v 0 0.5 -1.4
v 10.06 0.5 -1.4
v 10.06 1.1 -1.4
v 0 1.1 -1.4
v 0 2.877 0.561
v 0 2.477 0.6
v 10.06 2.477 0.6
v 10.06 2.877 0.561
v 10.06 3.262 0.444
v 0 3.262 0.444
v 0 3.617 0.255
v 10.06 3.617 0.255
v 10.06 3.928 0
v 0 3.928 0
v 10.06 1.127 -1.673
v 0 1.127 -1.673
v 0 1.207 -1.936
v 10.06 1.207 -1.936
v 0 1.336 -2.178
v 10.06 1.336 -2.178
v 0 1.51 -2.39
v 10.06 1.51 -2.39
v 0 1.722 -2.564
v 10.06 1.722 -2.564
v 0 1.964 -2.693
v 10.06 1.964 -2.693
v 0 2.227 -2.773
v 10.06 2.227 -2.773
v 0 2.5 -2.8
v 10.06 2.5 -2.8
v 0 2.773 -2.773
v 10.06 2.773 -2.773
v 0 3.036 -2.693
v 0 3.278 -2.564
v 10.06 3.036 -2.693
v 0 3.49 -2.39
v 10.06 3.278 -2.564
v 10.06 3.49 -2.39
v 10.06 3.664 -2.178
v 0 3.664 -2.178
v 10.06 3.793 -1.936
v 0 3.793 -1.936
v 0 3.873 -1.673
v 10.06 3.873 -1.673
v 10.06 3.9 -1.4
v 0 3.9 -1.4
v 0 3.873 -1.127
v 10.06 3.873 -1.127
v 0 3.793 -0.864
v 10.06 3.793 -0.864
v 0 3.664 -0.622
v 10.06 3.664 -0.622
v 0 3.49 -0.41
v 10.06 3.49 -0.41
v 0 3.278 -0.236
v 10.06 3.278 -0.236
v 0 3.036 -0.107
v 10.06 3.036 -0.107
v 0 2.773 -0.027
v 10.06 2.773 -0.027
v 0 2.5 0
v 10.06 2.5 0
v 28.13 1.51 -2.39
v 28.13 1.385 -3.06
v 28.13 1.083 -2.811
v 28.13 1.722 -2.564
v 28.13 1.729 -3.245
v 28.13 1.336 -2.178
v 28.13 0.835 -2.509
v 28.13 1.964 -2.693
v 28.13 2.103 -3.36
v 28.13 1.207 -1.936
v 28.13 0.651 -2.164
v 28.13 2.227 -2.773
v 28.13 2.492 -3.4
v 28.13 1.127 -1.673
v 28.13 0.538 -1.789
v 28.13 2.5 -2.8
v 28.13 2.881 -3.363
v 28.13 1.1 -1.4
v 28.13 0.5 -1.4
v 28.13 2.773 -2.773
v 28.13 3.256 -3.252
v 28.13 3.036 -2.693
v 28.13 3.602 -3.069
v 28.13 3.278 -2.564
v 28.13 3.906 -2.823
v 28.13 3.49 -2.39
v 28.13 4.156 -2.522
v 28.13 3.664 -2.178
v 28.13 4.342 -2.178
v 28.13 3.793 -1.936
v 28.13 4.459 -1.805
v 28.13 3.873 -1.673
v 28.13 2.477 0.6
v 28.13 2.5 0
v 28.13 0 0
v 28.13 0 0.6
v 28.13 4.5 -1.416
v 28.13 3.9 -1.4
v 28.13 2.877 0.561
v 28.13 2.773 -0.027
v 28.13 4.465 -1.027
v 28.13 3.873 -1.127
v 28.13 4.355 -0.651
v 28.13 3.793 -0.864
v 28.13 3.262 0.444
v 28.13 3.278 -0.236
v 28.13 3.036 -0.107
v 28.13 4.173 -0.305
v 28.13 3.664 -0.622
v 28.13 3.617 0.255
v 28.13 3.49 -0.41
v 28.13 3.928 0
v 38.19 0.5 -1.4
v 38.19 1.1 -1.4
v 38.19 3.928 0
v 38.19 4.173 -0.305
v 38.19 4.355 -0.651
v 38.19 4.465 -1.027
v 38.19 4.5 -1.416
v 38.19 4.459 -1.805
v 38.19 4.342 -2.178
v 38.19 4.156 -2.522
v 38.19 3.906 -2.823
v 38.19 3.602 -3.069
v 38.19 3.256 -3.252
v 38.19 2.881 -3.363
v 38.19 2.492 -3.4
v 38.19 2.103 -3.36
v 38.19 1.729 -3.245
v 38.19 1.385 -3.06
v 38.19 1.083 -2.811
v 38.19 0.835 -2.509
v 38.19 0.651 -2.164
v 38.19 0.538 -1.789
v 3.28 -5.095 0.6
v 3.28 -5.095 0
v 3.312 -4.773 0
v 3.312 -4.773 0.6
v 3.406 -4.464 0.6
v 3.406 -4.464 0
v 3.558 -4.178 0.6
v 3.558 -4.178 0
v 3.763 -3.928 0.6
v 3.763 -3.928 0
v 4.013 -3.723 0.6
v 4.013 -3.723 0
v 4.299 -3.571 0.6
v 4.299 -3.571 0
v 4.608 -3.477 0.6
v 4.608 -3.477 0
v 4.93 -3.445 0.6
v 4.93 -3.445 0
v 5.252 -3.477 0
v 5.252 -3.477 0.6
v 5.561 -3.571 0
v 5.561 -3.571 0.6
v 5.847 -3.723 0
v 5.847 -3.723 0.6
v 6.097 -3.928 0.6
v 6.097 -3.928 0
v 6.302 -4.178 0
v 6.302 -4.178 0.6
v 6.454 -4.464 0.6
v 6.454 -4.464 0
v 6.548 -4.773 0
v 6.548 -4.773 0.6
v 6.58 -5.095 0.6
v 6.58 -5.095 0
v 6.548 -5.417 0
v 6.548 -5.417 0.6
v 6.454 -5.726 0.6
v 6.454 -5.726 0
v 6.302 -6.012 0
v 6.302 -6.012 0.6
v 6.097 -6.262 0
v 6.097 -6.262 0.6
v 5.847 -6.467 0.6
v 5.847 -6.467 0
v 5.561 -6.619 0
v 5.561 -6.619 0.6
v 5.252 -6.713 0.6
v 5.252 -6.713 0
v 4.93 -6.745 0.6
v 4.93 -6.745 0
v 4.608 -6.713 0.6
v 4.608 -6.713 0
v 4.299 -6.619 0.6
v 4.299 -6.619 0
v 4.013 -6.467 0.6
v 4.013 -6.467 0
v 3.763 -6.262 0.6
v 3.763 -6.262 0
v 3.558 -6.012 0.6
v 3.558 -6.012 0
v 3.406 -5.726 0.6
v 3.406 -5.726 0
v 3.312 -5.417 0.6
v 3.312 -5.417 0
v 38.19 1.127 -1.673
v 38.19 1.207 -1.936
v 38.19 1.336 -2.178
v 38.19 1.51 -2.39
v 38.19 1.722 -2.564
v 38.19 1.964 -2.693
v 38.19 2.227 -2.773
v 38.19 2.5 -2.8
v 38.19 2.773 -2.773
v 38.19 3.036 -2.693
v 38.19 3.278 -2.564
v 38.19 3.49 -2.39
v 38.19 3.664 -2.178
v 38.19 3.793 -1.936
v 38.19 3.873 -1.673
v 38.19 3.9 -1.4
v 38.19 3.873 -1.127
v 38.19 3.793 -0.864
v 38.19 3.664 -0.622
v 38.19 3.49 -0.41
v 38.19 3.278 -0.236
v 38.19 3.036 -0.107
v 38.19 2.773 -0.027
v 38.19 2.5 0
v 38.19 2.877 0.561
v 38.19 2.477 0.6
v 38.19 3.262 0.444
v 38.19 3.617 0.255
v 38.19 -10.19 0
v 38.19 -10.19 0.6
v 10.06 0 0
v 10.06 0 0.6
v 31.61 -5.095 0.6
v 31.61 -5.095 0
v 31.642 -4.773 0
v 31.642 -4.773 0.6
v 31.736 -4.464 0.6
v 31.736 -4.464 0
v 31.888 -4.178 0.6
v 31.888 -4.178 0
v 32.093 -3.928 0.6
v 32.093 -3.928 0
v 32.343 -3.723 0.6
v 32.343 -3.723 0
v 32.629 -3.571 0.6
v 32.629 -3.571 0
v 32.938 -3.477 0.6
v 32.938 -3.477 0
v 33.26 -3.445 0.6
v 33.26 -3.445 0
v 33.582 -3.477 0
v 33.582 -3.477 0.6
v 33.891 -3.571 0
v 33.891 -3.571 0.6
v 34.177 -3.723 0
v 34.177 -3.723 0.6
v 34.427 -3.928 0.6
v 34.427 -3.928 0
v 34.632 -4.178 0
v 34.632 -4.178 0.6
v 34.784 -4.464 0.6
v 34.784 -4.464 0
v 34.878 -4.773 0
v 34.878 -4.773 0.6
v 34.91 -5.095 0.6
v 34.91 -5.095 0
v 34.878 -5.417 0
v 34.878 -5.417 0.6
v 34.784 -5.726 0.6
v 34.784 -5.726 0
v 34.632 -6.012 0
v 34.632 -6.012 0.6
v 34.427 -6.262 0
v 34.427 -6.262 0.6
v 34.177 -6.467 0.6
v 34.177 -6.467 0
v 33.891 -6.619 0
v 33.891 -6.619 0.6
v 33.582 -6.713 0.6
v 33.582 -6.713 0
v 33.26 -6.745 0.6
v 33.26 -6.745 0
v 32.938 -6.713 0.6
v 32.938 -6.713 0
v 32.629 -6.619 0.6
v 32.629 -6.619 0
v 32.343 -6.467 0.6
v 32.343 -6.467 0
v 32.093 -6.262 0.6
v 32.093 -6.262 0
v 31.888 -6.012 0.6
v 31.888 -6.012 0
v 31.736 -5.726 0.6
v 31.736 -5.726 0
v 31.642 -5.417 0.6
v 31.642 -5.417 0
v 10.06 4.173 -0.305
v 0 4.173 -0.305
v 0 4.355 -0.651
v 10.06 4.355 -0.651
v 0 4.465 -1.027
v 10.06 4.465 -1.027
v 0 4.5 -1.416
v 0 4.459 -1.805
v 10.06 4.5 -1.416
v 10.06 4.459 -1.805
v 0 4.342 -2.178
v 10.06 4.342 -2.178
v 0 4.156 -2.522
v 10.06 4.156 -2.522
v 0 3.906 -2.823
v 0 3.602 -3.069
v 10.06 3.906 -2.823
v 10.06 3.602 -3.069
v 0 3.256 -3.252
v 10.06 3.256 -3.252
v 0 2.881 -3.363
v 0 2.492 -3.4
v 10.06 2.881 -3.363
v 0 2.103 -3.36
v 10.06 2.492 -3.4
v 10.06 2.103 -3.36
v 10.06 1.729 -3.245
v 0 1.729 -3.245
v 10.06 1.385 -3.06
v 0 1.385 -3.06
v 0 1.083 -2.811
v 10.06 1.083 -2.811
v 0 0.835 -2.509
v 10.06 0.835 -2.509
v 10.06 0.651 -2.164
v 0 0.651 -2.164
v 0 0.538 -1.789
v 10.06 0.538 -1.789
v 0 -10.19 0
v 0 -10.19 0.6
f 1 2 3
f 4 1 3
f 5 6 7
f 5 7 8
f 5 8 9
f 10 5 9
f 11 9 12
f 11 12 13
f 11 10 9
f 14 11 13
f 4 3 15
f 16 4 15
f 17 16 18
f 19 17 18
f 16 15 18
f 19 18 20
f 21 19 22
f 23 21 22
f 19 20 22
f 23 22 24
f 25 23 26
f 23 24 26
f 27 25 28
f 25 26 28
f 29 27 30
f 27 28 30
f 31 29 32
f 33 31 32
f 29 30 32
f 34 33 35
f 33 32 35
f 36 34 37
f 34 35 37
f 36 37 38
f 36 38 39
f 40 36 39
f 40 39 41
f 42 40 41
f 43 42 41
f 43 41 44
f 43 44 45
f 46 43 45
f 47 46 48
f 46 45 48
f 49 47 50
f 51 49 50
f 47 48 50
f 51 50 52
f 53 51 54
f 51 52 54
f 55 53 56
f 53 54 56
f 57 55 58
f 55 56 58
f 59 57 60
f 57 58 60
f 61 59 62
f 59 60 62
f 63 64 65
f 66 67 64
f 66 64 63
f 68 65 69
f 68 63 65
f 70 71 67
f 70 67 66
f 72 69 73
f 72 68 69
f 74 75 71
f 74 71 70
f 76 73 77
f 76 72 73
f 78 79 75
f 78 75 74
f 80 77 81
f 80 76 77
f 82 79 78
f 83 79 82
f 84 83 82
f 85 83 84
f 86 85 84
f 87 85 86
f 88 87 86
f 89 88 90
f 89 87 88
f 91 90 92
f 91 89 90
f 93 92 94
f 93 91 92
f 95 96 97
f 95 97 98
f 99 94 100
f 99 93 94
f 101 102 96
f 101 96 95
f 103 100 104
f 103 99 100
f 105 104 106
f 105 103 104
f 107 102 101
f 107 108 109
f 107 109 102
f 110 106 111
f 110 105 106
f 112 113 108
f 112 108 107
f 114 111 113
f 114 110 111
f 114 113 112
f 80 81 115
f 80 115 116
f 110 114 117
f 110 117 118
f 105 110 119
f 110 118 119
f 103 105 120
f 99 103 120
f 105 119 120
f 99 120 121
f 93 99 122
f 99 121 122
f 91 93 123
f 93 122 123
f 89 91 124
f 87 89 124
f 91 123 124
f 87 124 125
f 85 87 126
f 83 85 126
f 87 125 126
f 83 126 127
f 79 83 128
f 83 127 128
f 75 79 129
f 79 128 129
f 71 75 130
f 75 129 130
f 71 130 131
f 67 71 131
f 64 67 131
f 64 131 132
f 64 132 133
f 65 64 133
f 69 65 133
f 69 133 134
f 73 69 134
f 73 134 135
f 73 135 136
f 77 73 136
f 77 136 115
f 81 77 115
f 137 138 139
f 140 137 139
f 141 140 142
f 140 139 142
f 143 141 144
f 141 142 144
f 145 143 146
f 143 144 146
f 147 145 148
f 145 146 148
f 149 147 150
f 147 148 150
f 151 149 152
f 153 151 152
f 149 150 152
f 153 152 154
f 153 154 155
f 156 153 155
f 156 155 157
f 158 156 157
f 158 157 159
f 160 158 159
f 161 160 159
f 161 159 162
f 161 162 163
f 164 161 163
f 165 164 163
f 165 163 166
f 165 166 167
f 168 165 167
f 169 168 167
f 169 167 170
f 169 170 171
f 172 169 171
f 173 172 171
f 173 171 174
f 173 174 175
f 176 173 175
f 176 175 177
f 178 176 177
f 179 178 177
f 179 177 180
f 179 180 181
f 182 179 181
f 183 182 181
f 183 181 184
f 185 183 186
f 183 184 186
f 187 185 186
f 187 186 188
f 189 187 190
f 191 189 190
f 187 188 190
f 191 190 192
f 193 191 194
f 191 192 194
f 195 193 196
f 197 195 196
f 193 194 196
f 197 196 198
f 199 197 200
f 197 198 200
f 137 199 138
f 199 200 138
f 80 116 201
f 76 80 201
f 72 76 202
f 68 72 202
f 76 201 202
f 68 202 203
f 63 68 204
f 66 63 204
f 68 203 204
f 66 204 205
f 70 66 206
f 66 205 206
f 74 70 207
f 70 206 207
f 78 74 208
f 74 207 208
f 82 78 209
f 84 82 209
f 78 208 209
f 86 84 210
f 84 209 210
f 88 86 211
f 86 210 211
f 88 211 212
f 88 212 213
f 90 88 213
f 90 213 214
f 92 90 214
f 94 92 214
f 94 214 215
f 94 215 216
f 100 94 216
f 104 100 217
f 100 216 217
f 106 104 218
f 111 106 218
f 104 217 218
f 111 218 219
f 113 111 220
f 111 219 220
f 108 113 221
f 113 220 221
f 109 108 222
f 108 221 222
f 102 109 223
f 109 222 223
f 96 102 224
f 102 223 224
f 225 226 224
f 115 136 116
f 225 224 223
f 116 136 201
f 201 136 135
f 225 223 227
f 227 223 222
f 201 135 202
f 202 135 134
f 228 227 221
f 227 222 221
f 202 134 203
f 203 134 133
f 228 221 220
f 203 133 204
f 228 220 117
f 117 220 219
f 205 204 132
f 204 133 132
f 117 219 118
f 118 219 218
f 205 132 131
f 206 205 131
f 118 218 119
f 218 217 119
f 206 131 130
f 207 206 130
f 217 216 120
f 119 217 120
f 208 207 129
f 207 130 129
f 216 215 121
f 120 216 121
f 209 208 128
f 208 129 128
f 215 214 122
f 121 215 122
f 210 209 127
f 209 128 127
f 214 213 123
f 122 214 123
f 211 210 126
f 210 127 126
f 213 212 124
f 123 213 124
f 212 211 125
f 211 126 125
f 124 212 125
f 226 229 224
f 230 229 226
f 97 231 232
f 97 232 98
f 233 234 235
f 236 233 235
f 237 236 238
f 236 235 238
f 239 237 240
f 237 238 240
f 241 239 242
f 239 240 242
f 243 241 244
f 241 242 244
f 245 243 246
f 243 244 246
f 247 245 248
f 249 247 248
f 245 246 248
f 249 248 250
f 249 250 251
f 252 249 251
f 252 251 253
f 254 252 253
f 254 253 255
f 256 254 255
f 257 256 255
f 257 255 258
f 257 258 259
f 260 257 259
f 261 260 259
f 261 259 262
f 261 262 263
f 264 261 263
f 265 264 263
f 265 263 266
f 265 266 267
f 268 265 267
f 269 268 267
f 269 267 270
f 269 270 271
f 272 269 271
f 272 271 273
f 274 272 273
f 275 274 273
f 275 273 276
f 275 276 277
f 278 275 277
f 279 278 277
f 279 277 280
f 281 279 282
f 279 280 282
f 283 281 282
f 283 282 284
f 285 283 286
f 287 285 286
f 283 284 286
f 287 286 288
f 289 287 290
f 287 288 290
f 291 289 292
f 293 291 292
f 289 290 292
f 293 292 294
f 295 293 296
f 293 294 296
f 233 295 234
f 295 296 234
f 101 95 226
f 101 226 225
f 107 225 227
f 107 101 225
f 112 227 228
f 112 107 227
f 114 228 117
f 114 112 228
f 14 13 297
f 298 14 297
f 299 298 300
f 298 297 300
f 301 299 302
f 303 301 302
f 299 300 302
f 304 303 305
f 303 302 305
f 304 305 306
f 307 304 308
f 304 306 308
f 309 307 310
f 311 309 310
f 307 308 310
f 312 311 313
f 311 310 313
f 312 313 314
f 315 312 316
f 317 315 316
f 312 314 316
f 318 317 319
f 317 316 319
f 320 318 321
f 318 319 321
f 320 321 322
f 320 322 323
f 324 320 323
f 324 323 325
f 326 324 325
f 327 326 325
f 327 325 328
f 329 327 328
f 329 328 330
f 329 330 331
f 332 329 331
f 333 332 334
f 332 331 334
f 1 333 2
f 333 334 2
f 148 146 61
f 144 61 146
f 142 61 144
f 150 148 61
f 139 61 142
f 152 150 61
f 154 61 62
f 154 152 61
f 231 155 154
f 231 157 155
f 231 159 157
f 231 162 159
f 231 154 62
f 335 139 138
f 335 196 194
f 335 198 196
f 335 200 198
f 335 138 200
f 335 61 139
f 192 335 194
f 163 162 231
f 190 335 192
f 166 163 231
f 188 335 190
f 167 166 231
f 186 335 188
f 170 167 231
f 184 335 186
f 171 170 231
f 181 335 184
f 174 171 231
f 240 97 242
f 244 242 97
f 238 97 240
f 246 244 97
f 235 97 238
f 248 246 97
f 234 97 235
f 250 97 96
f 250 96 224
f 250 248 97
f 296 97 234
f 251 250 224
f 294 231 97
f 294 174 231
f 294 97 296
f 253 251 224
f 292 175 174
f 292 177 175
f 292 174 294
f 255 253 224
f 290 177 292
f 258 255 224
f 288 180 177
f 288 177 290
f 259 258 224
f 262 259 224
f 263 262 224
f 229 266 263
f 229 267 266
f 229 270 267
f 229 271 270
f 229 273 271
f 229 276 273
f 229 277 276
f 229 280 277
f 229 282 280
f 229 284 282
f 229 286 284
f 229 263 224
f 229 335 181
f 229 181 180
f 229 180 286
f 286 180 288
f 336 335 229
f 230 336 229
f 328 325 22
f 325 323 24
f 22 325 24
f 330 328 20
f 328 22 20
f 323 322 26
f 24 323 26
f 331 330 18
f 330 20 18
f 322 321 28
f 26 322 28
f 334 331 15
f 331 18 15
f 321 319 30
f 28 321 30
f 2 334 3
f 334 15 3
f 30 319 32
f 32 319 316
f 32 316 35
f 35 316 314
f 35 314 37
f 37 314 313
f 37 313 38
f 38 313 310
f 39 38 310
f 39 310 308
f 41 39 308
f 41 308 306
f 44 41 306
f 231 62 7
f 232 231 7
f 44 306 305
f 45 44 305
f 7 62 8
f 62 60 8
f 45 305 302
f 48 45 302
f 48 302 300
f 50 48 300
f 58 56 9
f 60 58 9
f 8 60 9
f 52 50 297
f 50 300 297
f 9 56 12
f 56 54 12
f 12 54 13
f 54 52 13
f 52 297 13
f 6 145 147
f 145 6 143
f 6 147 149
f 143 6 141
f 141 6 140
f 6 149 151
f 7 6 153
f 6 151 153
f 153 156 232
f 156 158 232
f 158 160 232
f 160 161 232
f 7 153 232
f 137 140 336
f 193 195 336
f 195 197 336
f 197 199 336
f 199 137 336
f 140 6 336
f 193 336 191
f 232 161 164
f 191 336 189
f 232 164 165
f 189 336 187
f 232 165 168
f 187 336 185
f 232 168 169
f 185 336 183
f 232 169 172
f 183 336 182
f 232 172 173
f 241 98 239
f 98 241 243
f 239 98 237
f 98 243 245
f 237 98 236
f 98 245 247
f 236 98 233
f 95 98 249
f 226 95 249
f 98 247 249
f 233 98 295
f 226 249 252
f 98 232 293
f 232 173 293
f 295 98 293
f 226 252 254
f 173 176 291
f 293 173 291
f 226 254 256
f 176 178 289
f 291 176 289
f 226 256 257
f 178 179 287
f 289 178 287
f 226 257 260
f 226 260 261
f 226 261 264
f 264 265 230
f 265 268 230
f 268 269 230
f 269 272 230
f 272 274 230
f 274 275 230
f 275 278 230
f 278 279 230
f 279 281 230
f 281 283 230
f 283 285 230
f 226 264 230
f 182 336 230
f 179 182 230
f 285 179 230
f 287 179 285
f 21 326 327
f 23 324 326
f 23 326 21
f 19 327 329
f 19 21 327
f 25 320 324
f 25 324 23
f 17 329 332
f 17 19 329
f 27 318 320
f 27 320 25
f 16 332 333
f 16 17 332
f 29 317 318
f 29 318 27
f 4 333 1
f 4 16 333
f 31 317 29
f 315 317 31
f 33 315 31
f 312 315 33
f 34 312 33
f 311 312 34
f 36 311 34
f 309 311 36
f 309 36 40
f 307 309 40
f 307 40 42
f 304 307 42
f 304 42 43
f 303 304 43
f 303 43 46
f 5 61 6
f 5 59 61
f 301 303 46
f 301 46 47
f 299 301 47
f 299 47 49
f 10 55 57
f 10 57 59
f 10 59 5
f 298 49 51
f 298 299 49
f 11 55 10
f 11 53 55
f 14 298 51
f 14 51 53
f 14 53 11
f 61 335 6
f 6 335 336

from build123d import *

# Parameters (mm, degrees)
SKETCH1_W           = 38.19
SKETCH1_H           = 10.19
BOSS_EXTRUDE1_DEPTH = 0.6
SKETCH2_W           = 10.06
SKETCH2_H           = 0.6
BOSS_EXTRUDE2_DEPTH = 4.5
BOSS_EXTRUDE3_DEPTH = 10.06
BOSS_EXTRUDE4_START = -10.06
BOSS_EXTRUDE4_DEPTH = 10.06
CUT_EXTRUDE1_DEPTH  = 40.672058177
SKETCH7_R           = 1.65
CUT_EXTRUDE2_DEPTH  = 10.01


with BuildPart() as part:
    # Sketch1 → Boss-Extrude1 (new body)
    with BuildSketch(Plane.XY):
        with Locations((19.095, -5.095)):
            Rectangle(SKETCH1_W, SKETCH1_H)
    extrude(amount=BOSS_EXTRUDE1_DEPTH)

    # Sketch2 → Boss-Extrude2 (add)
    with BuildSketch(Plane(origin=(0, 0, 0), x_dir=(1, 0, 0), z_dir=(0, 1, 0))):
        with Locations((5.03, -0.3)):
            Rectangle(SKETCH2_W, SKETCH2_H)
        with Locations((33.16, -0.3)):
            Rectangle(SKETCH2_W, SKETCH2_H)
    extrude(amount=BOSS_EXTRUDE2_DEPTH)

    # Sketch4 → Boss-Extrude3 (add)
    with BuildSketch(Plane(origin=(38.19, 0, 0), x_dir=(0, 0, -1), z_dir=(1, 0, 0))):
        with BuildLine():
            Line((0, 2.5), (-0.6, 2.5))
            ThreePointArc((-0.6, 2.5), (2.814213562, 3.914213562), (1.4, 0.5))
            Line((1.4, 0.5), (1.4, 1.1))
            ThreePointArc((1.4, 1.1), (2.389949494, 3.489949494), (0, 2.5))
        make_face()
    extrude(amount=-BOSS_EXTRUDE3_DEPTH)

    # Sketch5 → Boss-Extrude4 (add)
    with BuildSketch(Plane.ZY.offset(BOSS_EXTRUDE4_START)):
        with BuildLine():
            ThreePointArc((-1.4, 1.1), (-2.389949494, 3.489949494), (0, 2.5))
            Line((0, 2.5), (0, 3.928285686))
            ThreePointArc((0, 3.928285686), (-3.251563039, 3.256117924), (-1.4, 0.5))
            Line((-1.4, 0.5), (-1.4, 1.1))
        make_face()
        with BuildLine():
            Line((0, 3.928285686), (0, 2.5))
            Line((0, 2.5), (0.6, 2.5))
            ThreePointArc((0.6, 2.5), (0.443908891, 3.274596669), (0, 3.928285686))
        make_face()
    extrude(amount=BOSS_EXTRUDE4_DEPTH)

    # Sketch6 → Cut-Extrude1 (cut, through all)
    with BuildSketch(Plane.ZY):
        with BuildLine():
            Line((0, 3.928285686), (0, 4.5))
            Line((0, 4.5), (0.6, 4.5))
            Line((0.6, 4.5), (0.6, 2.47666439))
            ThreePointArc((0.6, 2.47666439), (0.44408843, 3.262031245), (0, 3.928285686))
        make_face()
    extrude(amount=-CUT_EXTRUDE1_DEPTH, mode=Mode.SUBTRACT)

    # Sketch7 → Cut-Extrude2 (cut)
    with BuildSketch(Plane(origin=(0, 0, 0), x_dir=(-1, 0, 0), z_dir=(0, 0, -1))):
        with Locations((-33.26, -5.095)):
            Circle(SKETCH7_R)
        with Locations((-4.93, -5.095)):
            Circle(SKETCH7_R)
    extrude(amount=-CUT_EXTRUDE2_DEPTH, mode=Mode.SUBTRACT)


solid = part.part
